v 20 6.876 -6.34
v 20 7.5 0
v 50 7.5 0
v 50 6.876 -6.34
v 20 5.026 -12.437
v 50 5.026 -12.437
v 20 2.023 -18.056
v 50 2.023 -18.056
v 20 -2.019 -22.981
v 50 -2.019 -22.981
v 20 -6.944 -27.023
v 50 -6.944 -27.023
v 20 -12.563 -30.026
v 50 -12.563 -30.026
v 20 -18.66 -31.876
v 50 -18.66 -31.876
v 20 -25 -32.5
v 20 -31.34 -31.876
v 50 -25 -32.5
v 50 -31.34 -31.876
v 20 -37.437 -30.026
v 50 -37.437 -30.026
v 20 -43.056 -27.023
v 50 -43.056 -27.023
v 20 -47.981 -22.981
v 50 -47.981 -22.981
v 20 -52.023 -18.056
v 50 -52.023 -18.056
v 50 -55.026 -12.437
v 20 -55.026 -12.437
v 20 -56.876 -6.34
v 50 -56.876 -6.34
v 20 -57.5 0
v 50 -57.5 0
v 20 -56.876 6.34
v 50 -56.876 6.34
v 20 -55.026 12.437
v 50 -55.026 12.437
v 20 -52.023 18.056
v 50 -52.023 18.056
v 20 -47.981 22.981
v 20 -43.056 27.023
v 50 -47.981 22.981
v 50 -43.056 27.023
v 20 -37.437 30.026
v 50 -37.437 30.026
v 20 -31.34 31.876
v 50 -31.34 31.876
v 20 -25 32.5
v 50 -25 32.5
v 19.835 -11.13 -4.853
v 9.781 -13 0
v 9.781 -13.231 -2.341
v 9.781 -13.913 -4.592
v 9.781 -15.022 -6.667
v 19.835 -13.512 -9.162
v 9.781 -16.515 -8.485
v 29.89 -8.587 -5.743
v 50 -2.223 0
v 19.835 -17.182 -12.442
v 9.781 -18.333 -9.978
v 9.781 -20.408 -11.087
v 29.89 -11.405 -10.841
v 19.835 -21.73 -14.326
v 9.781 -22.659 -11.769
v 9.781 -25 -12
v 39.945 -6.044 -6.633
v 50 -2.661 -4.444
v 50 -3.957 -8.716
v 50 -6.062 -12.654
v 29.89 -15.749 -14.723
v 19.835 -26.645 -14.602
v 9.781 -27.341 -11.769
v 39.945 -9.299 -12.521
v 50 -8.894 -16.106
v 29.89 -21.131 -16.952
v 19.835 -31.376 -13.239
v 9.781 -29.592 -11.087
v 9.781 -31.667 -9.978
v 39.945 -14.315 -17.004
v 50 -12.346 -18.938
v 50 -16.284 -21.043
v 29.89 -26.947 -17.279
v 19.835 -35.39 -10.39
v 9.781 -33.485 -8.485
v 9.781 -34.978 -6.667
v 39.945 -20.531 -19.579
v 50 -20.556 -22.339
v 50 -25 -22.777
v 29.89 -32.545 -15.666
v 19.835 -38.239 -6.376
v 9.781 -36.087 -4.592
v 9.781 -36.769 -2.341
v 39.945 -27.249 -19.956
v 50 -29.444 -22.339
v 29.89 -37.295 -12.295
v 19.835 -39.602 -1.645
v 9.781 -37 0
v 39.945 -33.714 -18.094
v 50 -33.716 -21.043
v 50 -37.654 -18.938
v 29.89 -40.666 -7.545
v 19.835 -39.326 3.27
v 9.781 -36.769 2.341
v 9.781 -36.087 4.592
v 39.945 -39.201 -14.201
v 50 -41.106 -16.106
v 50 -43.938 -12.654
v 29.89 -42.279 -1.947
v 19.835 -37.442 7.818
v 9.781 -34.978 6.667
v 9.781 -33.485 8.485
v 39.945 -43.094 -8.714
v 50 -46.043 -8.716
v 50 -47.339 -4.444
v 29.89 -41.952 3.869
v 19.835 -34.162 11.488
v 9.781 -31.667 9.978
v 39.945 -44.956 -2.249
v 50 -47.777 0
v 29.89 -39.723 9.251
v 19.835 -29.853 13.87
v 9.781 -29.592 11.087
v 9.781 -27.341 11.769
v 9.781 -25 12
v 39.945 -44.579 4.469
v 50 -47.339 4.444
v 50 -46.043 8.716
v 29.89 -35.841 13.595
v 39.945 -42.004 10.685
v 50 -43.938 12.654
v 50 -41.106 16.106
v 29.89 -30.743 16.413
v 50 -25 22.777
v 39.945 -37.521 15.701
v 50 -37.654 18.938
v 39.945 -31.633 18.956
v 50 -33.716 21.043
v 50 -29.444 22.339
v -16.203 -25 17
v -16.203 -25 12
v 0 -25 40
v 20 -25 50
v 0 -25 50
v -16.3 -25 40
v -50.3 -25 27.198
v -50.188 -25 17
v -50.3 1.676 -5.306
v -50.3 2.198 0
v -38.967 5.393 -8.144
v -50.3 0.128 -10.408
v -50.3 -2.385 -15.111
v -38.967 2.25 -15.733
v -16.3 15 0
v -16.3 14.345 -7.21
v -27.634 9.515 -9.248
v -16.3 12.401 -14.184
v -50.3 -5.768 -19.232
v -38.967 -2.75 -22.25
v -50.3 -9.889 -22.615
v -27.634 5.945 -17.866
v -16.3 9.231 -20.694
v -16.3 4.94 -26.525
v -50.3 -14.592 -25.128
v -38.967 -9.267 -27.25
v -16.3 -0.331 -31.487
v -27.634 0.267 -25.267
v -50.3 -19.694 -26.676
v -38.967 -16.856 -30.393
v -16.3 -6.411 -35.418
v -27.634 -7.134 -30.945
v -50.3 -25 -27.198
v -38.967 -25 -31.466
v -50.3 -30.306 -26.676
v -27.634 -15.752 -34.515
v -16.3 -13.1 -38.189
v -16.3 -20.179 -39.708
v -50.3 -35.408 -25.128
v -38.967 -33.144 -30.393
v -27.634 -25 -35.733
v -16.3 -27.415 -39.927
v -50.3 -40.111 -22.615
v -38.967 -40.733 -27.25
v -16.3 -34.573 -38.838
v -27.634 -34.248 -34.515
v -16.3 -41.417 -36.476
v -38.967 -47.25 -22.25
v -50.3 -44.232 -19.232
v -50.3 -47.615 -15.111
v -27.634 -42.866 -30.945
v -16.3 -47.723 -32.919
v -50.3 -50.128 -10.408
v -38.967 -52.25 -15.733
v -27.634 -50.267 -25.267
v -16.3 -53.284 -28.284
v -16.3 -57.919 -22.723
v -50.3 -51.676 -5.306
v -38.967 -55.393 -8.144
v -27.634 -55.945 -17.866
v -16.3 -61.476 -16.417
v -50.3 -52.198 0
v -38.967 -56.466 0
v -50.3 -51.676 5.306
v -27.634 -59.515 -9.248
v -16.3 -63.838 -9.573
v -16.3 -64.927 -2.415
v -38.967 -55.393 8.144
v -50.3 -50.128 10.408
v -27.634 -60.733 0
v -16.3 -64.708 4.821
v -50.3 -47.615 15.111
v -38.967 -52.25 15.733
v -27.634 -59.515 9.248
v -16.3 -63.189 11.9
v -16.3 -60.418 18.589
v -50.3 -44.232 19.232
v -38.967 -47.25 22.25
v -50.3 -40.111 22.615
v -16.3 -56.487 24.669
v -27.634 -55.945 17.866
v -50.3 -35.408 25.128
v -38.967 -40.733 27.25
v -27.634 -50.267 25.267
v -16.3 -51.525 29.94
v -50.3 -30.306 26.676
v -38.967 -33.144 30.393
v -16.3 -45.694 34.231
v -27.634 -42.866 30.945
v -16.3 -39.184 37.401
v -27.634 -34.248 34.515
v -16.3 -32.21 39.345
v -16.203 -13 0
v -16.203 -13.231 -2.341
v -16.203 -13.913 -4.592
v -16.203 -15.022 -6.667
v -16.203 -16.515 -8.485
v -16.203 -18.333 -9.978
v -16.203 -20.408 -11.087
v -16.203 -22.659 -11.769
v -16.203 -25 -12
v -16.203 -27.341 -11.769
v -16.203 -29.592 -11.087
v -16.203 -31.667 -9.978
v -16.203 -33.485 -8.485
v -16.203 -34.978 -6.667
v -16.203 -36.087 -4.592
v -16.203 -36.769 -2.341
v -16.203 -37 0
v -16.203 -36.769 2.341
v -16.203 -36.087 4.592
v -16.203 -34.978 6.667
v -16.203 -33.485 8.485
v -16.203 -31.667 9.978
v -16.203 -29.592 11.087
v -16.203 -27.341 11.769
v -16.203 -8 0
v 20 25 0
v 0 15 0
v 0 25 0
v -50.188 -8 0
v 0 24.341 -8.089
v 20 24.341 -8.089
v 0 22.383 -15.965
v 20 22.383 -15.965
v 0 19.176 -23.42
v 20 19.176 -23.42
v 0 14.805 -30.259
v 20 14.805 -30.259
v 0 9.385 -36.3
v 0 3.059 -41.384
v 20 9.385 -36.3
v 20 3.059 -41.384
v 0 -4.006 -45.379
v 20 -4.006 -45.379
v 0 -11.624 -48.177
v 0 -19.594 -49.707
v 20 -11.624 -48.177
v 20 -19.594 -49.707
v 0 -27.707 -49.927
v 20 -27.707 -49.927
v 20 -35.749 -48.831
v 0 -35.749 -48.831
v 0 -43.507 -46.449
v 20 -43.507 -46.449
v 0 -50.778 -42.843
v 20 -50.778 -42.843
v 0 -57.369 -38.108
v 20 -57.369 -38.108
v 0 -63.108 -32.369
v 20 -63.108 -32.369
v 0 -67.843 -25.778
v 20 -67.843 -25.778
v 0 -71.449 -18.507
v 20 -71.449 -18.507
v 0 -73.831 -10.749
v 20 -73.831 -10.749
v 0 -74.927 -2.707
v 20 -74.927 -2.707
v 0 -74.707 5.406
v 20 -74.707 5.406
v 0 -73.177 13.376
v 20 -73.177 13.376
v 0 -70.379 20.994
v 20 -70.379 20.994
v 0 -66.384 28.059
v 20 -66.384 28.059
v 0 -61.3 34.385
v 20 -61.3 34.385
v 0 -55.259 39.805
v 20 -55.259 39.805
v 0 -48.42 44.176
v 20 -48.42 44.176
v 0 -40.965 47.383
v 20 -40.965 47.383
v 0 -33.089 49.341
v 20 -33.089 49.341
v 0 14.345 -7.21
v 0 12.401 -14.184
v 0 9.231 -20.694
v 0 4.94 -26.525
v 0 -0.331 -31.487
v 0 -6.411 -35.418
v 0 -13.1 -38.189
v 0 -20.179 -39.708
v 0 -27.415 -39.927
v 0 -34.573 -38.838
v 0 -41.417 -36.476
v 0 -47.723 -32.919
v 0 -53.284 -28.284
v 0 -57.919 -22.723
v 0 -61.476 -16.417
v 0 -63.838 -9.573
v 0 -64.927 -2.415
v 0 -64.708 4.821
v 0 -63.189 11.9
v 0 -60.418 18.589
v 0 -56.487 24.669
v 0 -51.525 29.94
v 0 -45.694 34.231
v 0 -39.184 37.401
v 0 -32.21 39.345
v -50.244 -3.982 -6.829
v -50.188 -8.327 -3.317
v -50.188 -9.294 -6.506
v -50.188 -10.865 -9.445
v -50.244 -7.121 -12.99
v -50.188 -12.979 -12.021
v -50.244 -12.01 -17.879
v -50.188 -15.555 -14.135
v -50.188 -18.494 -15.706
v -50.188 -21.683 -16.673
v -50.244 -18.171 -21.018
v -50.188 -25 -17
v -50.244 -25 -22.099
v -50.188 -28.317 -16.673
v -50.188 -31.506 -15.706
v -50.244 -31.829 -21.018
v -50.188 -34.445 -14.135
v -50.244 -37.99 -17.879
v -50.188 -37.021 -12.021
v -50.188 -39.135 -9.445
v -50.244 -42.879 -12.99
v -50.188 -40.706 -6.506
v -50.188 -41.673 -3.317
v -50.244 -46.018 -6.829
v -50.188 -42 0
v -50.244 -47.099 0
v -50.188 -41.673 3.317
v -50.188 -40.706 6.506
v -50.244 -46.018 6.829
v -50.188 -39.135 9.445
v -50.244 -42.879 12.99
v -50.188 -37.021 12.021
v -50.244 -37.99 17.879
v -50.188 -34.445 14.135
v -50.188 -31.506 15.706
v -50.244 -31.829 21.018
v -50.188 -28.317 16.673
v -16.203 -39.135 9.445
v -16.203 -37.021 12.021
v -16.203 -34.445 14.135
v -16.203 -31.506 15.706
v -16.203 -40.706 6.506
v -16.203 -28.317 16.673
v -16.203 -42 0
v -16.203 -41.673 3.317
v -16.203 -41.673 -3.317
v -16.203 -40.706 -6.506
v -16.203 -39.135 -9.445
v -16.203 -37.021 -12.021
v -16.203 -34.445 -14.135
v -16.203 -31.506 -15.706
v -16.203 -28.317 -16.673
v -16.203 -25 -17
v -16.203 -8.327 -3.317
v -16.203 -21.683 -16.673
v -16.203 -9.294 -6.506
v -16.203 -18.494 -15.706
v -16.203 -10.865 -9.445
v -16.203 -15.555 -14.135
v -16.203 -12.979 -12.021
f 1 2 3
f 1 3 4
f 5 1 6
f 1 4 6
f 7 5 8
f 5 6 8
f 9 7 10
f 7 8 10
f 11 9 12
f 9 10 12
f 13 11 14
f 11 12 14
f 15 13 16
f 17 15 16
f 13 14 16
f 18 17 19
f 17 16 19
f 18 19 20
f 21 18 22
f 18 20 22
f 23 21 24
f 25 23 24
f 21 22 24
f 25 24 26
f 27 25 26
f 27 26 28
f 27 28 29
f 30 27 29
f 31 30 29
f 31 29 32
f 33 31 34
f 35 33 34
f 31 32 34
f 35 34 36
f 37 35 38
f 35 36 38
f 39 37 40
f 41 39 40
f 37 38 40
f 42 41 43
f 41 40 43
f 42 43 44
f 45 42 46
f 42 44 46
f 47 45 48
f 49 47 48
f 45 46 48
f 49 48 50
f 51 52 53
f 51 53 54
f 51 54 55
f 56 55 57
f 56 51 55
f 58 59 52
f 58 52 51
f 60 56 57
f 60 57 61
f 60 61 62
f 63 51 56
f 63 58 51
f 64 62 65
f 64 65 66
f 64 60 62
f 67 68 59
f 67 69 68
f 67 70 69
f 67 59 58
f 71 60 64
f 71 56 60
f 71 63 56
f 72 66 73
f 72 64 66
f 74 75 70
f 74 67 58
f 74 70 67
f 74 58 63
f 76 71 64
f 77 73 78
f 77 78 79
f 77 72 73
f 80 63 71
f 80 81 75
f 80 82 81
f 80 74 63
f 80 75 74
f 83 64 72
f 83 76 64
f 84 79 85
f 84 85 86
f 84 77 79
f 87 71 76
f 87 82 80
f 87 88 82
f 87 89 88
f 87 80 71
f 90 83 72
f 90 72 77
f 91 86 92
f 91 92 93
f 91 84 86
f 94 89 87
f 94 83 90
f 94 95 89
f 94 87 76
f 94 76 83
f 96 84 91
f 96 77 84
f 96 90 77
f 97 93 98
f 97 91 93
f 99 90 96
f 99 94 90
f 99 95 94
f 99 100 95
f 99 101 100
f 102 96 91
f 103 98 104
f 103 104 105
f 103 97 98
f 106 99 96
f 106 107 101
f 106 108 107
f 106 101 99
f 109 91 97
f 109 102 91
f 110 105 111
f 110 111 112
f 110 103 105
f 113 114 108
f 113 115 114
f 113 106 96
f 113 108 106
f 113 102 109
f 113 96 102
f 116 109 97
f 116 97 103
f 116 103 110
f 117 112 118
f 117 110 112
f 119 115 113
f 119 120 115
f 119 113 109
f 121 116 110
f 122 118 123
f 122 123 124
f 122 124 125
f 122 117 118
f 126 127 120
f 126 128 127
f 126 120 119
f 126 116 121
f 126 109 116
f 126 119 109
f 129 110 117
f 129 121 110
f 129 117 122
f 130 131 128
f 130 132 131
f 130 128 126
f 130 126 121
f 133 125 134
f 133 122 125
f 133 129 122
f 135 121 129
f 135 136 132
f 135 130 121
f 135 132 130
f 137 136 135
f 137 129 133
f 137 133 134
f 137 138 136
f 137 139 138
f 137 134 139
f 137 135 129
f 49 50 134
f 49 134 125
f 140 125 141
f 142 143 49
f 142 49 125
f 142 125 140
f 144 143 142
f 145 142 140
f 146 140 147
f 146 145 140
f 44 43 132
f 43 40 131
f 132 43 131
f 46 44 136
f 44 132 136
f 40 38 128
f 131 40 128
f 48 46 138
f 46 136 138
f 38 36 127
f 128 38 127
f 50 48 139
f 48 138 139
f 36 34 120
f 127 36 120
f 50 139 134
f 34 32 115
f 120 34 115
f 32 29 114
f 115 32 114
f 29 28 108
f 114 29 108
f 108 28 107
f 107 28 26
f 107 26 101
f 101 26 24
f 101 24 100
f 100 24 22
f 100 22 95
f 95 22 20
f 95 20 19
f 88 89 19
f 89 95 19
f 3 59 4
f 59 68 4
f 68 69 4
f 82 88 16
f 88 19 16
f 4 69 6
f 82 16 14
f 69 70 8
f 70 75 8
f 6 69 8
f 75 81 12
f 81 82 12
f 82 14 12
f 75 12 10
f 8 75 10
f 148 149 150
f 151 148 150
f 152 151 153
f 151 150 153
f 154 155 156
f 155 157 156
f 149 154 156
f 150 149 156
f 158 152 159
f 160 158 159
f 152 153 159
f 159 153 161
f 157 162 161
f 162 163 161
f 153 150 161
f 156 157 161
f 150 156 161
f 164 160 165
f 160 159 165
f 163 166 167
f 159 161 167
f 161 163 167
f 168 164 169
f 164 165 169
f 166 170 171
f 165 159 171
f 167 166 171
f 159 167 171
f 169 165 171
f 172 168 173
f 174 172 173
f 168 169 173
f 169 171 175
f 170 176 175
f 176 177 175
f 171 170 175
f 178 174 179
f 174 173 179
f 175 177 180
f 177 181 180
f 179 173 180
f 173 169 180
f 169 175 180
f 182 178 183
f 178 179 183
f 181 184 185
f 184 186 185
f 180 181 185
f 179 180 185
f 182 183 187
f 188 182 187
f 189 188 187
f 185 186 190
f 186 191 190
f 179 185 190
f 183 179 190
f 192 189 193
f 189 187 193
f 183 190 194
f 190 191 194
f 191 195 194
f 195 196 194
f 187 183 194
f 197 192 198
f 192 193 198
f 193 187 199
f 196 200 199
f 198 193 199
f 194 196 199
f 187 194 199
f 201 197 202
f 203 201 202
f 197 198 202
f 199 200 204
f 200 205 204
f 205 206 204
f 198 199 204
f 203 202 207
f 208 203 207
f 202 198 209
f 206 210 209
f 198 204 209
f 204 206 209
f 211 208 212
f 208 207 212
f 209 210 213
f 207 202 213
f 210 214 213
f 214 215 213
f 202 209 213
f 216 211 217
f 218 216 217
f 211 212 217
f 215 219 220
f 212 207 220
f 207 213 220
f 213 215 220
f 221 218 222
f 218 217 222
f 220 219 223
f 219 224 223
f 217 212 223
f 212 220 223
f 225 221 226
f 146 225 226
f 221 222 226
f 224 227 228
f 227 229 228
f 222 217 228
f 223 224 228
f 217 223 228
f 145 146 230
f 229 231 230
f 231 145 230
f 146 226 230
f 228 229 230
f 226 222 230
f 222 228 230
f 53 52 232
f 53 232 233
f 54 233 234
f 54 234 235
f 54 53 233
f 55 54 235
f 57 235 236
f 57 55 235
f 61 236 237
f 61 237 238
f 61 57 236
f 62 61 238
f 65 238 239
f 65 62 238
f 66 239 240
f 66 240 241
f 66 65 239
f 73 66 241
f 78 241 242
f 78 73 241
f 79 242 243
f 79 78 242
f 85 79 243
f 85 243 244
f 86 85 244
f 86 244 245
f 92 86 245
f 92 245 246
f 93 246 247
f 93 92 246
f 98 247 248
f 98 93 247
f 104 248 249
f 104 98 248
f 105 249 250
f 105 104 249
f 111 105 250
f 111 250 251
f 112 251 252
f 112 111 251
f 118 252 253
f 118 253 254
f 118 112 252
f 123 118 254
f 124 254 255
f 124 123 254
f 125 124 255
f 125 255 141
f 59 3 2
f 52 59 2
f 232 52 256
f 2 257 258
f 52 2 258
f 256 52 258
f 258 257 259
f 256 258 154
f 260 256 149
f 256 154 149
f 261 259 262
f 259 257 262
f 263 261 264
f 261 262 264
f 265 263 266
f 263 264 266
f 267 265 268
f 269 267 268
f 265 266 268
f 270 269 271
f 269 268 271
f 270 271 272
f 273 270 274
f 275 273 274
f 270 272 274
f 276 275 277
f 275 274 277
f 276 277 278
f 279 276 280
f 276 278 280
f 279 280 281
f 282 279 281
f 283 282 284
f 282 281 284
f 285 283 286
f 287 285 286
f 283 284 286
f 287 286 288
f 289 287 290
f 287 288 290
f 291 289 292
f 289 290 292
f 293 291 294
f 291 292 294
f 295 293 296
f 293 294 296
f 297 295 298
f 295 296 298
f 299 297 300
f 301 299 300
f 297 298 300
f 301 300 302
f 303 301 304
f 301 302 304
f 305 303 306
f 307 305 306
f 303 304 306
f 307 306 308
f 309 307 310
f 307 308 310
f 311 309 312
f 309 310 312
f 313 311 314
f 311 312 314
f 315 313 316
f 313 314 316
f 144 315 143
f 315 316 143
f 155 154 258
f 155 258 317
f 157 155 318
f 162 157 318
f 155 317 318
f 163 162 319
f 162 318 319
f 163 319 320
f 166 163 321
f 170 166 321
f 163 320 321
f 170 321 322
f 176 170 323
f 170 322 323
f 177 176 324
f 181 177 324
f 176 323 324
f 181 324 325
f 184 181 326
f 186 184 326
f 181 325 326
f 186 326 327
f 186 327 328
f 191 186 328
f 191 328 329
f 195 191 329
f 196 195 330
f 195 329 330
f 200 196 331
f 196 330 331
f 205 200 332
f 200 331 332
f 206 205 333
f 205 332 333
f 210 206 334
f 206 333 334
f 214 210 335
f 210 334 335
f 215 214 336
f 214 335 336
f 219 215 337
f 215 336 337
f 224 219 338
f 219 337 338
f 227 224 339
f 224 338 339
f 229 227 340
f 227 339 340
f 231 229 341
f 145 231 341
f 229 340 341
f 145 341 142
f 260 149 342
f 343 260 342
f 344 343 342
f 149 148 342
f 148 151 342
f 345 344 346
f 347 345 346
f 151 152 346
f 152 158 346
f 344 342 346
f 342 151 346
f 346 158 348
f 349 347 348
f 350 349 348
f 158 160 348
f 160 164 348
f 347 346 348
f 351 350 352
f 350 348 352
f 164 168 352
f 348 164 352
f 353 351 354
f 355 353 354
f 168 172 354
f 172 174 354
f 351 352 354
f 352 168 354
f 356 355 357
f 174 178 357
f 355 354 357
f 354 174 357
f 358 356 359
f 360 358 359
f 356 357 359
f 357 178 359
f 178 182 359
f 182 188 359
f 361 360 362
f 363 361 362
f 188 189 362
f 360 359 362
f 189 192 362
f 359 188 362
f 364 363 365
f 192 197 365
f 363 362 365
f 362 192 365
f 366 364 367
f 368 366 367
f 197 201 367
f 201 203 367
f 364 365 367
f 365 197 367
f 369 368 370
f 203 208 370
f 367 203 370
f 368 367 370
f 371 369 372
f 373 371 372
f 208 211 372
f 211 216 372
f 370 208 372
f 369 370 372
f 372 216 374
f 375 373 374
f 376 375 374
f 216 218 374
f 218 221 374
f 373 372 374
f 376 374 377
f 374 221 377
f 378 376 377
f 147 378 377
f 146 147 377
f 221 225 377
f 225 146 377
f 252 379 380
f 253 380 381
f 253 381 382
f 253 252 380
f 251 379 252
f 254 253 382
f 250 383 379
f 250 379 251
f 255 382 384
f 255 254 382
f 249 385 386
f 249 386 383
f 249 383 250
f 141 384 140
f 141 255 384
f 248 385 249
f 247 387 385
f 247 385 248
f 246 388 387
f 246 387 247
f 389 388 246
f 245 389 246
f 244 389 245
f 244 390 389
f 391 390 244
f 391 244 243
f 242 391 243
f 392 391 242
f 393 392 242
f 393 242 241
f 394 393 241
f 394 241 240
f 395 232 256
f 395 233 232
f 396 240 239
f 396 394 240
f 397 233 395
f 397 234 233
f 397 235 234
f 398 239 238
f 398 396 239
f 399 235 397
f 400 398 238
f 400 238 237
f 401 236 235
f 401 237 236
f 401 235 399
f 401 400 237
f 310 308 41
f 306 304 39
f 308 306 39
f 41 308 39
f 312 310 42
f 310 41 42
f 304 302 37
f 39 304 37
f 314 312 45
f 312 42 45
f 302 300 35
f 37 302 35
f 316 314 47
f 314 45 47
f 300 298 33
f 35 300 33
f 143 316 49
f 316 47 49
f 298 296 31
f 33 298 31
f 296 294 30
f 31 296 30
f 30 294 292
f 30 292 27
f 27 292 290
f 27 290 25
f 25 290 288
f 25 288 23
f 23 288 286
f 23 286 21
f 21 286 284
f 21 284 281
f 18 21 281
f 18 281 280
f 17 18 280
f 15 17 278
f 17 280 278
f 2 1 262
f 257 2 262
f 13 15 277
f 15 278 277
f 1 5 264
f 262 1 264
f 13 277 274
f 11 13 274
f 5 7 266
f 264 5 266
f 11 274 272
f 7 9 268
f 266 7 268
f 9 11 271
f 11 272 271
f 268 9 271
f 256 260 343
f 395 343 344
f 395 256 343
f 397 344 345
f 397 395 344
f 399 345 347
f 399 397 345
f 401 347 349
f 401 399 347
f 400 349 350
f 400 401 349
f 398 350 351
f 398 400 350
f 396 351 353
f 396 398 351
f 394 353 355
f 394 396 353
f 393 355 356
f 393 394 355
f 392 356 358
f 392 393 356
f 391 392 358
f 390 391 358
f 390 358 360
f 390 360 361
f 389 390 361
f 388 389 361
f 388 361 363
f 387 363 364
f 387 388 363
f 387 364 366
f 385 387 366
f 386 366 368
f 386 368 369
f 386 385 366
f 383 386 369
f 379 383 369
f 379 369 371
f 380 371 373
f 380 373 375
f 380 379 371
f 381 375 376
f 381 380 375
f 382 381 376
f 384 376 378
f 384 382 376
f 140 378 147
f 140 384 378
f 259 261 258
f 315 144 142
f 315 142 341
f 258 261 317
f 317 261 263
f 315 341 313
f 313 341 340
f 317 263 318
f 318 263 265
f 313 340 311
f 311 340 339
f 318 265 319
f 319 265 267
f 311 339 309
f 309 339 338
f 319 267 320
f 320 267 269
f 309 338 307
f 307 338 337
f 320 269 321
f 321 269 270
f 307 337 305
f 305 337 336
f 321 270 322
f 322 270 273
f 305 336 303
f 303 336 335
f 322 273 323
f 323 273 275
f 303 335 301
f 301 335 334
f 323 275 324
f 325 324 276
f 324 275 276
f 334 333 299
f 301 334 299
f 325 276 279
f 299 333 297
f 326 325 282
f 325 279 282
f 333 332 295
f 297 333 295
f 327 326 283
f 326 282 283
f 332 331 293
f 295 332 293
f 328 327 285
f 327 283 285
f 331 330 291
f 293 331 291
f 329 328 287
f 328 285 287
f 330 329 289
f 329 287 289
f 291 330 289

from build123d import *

# Parameters (mm, degrees)
REVOLVE1_ANGLE = 270


with BuildPart() as part:
    # Sketch1 → Revolve1 (revolve)
    with BuildSketch(Plane.XY):
        Polygon((-50, -25), (-50.300177152, 2.198343583), (-16.300177152, 15), (0, 15), (0, 25), (20, 25), (20, 7.5), (50, 7.5), (50, -25), align=None)
    revolve(axis=Axis((50, -25, 0), (-1, 0, 0)), revolution_arc=REVOLVE1_ANGLE)

    # Sketch2 → Cut-Revolve1 (revolve, cut)
    with BuildSketch(Plane.XY):
        Polygon((-50.187622145, -8), (-16.203429147, -8), (-16.203429147, -13), (9.780588509, -13), (50, -2.223241171), (50, -25), (-50.300177152, -25), align=None)
    revolve(axis=Axis((50, -25, 0), (-1, 0, 0)), mode=Mode.SUBTRACT)


solid = part.part
